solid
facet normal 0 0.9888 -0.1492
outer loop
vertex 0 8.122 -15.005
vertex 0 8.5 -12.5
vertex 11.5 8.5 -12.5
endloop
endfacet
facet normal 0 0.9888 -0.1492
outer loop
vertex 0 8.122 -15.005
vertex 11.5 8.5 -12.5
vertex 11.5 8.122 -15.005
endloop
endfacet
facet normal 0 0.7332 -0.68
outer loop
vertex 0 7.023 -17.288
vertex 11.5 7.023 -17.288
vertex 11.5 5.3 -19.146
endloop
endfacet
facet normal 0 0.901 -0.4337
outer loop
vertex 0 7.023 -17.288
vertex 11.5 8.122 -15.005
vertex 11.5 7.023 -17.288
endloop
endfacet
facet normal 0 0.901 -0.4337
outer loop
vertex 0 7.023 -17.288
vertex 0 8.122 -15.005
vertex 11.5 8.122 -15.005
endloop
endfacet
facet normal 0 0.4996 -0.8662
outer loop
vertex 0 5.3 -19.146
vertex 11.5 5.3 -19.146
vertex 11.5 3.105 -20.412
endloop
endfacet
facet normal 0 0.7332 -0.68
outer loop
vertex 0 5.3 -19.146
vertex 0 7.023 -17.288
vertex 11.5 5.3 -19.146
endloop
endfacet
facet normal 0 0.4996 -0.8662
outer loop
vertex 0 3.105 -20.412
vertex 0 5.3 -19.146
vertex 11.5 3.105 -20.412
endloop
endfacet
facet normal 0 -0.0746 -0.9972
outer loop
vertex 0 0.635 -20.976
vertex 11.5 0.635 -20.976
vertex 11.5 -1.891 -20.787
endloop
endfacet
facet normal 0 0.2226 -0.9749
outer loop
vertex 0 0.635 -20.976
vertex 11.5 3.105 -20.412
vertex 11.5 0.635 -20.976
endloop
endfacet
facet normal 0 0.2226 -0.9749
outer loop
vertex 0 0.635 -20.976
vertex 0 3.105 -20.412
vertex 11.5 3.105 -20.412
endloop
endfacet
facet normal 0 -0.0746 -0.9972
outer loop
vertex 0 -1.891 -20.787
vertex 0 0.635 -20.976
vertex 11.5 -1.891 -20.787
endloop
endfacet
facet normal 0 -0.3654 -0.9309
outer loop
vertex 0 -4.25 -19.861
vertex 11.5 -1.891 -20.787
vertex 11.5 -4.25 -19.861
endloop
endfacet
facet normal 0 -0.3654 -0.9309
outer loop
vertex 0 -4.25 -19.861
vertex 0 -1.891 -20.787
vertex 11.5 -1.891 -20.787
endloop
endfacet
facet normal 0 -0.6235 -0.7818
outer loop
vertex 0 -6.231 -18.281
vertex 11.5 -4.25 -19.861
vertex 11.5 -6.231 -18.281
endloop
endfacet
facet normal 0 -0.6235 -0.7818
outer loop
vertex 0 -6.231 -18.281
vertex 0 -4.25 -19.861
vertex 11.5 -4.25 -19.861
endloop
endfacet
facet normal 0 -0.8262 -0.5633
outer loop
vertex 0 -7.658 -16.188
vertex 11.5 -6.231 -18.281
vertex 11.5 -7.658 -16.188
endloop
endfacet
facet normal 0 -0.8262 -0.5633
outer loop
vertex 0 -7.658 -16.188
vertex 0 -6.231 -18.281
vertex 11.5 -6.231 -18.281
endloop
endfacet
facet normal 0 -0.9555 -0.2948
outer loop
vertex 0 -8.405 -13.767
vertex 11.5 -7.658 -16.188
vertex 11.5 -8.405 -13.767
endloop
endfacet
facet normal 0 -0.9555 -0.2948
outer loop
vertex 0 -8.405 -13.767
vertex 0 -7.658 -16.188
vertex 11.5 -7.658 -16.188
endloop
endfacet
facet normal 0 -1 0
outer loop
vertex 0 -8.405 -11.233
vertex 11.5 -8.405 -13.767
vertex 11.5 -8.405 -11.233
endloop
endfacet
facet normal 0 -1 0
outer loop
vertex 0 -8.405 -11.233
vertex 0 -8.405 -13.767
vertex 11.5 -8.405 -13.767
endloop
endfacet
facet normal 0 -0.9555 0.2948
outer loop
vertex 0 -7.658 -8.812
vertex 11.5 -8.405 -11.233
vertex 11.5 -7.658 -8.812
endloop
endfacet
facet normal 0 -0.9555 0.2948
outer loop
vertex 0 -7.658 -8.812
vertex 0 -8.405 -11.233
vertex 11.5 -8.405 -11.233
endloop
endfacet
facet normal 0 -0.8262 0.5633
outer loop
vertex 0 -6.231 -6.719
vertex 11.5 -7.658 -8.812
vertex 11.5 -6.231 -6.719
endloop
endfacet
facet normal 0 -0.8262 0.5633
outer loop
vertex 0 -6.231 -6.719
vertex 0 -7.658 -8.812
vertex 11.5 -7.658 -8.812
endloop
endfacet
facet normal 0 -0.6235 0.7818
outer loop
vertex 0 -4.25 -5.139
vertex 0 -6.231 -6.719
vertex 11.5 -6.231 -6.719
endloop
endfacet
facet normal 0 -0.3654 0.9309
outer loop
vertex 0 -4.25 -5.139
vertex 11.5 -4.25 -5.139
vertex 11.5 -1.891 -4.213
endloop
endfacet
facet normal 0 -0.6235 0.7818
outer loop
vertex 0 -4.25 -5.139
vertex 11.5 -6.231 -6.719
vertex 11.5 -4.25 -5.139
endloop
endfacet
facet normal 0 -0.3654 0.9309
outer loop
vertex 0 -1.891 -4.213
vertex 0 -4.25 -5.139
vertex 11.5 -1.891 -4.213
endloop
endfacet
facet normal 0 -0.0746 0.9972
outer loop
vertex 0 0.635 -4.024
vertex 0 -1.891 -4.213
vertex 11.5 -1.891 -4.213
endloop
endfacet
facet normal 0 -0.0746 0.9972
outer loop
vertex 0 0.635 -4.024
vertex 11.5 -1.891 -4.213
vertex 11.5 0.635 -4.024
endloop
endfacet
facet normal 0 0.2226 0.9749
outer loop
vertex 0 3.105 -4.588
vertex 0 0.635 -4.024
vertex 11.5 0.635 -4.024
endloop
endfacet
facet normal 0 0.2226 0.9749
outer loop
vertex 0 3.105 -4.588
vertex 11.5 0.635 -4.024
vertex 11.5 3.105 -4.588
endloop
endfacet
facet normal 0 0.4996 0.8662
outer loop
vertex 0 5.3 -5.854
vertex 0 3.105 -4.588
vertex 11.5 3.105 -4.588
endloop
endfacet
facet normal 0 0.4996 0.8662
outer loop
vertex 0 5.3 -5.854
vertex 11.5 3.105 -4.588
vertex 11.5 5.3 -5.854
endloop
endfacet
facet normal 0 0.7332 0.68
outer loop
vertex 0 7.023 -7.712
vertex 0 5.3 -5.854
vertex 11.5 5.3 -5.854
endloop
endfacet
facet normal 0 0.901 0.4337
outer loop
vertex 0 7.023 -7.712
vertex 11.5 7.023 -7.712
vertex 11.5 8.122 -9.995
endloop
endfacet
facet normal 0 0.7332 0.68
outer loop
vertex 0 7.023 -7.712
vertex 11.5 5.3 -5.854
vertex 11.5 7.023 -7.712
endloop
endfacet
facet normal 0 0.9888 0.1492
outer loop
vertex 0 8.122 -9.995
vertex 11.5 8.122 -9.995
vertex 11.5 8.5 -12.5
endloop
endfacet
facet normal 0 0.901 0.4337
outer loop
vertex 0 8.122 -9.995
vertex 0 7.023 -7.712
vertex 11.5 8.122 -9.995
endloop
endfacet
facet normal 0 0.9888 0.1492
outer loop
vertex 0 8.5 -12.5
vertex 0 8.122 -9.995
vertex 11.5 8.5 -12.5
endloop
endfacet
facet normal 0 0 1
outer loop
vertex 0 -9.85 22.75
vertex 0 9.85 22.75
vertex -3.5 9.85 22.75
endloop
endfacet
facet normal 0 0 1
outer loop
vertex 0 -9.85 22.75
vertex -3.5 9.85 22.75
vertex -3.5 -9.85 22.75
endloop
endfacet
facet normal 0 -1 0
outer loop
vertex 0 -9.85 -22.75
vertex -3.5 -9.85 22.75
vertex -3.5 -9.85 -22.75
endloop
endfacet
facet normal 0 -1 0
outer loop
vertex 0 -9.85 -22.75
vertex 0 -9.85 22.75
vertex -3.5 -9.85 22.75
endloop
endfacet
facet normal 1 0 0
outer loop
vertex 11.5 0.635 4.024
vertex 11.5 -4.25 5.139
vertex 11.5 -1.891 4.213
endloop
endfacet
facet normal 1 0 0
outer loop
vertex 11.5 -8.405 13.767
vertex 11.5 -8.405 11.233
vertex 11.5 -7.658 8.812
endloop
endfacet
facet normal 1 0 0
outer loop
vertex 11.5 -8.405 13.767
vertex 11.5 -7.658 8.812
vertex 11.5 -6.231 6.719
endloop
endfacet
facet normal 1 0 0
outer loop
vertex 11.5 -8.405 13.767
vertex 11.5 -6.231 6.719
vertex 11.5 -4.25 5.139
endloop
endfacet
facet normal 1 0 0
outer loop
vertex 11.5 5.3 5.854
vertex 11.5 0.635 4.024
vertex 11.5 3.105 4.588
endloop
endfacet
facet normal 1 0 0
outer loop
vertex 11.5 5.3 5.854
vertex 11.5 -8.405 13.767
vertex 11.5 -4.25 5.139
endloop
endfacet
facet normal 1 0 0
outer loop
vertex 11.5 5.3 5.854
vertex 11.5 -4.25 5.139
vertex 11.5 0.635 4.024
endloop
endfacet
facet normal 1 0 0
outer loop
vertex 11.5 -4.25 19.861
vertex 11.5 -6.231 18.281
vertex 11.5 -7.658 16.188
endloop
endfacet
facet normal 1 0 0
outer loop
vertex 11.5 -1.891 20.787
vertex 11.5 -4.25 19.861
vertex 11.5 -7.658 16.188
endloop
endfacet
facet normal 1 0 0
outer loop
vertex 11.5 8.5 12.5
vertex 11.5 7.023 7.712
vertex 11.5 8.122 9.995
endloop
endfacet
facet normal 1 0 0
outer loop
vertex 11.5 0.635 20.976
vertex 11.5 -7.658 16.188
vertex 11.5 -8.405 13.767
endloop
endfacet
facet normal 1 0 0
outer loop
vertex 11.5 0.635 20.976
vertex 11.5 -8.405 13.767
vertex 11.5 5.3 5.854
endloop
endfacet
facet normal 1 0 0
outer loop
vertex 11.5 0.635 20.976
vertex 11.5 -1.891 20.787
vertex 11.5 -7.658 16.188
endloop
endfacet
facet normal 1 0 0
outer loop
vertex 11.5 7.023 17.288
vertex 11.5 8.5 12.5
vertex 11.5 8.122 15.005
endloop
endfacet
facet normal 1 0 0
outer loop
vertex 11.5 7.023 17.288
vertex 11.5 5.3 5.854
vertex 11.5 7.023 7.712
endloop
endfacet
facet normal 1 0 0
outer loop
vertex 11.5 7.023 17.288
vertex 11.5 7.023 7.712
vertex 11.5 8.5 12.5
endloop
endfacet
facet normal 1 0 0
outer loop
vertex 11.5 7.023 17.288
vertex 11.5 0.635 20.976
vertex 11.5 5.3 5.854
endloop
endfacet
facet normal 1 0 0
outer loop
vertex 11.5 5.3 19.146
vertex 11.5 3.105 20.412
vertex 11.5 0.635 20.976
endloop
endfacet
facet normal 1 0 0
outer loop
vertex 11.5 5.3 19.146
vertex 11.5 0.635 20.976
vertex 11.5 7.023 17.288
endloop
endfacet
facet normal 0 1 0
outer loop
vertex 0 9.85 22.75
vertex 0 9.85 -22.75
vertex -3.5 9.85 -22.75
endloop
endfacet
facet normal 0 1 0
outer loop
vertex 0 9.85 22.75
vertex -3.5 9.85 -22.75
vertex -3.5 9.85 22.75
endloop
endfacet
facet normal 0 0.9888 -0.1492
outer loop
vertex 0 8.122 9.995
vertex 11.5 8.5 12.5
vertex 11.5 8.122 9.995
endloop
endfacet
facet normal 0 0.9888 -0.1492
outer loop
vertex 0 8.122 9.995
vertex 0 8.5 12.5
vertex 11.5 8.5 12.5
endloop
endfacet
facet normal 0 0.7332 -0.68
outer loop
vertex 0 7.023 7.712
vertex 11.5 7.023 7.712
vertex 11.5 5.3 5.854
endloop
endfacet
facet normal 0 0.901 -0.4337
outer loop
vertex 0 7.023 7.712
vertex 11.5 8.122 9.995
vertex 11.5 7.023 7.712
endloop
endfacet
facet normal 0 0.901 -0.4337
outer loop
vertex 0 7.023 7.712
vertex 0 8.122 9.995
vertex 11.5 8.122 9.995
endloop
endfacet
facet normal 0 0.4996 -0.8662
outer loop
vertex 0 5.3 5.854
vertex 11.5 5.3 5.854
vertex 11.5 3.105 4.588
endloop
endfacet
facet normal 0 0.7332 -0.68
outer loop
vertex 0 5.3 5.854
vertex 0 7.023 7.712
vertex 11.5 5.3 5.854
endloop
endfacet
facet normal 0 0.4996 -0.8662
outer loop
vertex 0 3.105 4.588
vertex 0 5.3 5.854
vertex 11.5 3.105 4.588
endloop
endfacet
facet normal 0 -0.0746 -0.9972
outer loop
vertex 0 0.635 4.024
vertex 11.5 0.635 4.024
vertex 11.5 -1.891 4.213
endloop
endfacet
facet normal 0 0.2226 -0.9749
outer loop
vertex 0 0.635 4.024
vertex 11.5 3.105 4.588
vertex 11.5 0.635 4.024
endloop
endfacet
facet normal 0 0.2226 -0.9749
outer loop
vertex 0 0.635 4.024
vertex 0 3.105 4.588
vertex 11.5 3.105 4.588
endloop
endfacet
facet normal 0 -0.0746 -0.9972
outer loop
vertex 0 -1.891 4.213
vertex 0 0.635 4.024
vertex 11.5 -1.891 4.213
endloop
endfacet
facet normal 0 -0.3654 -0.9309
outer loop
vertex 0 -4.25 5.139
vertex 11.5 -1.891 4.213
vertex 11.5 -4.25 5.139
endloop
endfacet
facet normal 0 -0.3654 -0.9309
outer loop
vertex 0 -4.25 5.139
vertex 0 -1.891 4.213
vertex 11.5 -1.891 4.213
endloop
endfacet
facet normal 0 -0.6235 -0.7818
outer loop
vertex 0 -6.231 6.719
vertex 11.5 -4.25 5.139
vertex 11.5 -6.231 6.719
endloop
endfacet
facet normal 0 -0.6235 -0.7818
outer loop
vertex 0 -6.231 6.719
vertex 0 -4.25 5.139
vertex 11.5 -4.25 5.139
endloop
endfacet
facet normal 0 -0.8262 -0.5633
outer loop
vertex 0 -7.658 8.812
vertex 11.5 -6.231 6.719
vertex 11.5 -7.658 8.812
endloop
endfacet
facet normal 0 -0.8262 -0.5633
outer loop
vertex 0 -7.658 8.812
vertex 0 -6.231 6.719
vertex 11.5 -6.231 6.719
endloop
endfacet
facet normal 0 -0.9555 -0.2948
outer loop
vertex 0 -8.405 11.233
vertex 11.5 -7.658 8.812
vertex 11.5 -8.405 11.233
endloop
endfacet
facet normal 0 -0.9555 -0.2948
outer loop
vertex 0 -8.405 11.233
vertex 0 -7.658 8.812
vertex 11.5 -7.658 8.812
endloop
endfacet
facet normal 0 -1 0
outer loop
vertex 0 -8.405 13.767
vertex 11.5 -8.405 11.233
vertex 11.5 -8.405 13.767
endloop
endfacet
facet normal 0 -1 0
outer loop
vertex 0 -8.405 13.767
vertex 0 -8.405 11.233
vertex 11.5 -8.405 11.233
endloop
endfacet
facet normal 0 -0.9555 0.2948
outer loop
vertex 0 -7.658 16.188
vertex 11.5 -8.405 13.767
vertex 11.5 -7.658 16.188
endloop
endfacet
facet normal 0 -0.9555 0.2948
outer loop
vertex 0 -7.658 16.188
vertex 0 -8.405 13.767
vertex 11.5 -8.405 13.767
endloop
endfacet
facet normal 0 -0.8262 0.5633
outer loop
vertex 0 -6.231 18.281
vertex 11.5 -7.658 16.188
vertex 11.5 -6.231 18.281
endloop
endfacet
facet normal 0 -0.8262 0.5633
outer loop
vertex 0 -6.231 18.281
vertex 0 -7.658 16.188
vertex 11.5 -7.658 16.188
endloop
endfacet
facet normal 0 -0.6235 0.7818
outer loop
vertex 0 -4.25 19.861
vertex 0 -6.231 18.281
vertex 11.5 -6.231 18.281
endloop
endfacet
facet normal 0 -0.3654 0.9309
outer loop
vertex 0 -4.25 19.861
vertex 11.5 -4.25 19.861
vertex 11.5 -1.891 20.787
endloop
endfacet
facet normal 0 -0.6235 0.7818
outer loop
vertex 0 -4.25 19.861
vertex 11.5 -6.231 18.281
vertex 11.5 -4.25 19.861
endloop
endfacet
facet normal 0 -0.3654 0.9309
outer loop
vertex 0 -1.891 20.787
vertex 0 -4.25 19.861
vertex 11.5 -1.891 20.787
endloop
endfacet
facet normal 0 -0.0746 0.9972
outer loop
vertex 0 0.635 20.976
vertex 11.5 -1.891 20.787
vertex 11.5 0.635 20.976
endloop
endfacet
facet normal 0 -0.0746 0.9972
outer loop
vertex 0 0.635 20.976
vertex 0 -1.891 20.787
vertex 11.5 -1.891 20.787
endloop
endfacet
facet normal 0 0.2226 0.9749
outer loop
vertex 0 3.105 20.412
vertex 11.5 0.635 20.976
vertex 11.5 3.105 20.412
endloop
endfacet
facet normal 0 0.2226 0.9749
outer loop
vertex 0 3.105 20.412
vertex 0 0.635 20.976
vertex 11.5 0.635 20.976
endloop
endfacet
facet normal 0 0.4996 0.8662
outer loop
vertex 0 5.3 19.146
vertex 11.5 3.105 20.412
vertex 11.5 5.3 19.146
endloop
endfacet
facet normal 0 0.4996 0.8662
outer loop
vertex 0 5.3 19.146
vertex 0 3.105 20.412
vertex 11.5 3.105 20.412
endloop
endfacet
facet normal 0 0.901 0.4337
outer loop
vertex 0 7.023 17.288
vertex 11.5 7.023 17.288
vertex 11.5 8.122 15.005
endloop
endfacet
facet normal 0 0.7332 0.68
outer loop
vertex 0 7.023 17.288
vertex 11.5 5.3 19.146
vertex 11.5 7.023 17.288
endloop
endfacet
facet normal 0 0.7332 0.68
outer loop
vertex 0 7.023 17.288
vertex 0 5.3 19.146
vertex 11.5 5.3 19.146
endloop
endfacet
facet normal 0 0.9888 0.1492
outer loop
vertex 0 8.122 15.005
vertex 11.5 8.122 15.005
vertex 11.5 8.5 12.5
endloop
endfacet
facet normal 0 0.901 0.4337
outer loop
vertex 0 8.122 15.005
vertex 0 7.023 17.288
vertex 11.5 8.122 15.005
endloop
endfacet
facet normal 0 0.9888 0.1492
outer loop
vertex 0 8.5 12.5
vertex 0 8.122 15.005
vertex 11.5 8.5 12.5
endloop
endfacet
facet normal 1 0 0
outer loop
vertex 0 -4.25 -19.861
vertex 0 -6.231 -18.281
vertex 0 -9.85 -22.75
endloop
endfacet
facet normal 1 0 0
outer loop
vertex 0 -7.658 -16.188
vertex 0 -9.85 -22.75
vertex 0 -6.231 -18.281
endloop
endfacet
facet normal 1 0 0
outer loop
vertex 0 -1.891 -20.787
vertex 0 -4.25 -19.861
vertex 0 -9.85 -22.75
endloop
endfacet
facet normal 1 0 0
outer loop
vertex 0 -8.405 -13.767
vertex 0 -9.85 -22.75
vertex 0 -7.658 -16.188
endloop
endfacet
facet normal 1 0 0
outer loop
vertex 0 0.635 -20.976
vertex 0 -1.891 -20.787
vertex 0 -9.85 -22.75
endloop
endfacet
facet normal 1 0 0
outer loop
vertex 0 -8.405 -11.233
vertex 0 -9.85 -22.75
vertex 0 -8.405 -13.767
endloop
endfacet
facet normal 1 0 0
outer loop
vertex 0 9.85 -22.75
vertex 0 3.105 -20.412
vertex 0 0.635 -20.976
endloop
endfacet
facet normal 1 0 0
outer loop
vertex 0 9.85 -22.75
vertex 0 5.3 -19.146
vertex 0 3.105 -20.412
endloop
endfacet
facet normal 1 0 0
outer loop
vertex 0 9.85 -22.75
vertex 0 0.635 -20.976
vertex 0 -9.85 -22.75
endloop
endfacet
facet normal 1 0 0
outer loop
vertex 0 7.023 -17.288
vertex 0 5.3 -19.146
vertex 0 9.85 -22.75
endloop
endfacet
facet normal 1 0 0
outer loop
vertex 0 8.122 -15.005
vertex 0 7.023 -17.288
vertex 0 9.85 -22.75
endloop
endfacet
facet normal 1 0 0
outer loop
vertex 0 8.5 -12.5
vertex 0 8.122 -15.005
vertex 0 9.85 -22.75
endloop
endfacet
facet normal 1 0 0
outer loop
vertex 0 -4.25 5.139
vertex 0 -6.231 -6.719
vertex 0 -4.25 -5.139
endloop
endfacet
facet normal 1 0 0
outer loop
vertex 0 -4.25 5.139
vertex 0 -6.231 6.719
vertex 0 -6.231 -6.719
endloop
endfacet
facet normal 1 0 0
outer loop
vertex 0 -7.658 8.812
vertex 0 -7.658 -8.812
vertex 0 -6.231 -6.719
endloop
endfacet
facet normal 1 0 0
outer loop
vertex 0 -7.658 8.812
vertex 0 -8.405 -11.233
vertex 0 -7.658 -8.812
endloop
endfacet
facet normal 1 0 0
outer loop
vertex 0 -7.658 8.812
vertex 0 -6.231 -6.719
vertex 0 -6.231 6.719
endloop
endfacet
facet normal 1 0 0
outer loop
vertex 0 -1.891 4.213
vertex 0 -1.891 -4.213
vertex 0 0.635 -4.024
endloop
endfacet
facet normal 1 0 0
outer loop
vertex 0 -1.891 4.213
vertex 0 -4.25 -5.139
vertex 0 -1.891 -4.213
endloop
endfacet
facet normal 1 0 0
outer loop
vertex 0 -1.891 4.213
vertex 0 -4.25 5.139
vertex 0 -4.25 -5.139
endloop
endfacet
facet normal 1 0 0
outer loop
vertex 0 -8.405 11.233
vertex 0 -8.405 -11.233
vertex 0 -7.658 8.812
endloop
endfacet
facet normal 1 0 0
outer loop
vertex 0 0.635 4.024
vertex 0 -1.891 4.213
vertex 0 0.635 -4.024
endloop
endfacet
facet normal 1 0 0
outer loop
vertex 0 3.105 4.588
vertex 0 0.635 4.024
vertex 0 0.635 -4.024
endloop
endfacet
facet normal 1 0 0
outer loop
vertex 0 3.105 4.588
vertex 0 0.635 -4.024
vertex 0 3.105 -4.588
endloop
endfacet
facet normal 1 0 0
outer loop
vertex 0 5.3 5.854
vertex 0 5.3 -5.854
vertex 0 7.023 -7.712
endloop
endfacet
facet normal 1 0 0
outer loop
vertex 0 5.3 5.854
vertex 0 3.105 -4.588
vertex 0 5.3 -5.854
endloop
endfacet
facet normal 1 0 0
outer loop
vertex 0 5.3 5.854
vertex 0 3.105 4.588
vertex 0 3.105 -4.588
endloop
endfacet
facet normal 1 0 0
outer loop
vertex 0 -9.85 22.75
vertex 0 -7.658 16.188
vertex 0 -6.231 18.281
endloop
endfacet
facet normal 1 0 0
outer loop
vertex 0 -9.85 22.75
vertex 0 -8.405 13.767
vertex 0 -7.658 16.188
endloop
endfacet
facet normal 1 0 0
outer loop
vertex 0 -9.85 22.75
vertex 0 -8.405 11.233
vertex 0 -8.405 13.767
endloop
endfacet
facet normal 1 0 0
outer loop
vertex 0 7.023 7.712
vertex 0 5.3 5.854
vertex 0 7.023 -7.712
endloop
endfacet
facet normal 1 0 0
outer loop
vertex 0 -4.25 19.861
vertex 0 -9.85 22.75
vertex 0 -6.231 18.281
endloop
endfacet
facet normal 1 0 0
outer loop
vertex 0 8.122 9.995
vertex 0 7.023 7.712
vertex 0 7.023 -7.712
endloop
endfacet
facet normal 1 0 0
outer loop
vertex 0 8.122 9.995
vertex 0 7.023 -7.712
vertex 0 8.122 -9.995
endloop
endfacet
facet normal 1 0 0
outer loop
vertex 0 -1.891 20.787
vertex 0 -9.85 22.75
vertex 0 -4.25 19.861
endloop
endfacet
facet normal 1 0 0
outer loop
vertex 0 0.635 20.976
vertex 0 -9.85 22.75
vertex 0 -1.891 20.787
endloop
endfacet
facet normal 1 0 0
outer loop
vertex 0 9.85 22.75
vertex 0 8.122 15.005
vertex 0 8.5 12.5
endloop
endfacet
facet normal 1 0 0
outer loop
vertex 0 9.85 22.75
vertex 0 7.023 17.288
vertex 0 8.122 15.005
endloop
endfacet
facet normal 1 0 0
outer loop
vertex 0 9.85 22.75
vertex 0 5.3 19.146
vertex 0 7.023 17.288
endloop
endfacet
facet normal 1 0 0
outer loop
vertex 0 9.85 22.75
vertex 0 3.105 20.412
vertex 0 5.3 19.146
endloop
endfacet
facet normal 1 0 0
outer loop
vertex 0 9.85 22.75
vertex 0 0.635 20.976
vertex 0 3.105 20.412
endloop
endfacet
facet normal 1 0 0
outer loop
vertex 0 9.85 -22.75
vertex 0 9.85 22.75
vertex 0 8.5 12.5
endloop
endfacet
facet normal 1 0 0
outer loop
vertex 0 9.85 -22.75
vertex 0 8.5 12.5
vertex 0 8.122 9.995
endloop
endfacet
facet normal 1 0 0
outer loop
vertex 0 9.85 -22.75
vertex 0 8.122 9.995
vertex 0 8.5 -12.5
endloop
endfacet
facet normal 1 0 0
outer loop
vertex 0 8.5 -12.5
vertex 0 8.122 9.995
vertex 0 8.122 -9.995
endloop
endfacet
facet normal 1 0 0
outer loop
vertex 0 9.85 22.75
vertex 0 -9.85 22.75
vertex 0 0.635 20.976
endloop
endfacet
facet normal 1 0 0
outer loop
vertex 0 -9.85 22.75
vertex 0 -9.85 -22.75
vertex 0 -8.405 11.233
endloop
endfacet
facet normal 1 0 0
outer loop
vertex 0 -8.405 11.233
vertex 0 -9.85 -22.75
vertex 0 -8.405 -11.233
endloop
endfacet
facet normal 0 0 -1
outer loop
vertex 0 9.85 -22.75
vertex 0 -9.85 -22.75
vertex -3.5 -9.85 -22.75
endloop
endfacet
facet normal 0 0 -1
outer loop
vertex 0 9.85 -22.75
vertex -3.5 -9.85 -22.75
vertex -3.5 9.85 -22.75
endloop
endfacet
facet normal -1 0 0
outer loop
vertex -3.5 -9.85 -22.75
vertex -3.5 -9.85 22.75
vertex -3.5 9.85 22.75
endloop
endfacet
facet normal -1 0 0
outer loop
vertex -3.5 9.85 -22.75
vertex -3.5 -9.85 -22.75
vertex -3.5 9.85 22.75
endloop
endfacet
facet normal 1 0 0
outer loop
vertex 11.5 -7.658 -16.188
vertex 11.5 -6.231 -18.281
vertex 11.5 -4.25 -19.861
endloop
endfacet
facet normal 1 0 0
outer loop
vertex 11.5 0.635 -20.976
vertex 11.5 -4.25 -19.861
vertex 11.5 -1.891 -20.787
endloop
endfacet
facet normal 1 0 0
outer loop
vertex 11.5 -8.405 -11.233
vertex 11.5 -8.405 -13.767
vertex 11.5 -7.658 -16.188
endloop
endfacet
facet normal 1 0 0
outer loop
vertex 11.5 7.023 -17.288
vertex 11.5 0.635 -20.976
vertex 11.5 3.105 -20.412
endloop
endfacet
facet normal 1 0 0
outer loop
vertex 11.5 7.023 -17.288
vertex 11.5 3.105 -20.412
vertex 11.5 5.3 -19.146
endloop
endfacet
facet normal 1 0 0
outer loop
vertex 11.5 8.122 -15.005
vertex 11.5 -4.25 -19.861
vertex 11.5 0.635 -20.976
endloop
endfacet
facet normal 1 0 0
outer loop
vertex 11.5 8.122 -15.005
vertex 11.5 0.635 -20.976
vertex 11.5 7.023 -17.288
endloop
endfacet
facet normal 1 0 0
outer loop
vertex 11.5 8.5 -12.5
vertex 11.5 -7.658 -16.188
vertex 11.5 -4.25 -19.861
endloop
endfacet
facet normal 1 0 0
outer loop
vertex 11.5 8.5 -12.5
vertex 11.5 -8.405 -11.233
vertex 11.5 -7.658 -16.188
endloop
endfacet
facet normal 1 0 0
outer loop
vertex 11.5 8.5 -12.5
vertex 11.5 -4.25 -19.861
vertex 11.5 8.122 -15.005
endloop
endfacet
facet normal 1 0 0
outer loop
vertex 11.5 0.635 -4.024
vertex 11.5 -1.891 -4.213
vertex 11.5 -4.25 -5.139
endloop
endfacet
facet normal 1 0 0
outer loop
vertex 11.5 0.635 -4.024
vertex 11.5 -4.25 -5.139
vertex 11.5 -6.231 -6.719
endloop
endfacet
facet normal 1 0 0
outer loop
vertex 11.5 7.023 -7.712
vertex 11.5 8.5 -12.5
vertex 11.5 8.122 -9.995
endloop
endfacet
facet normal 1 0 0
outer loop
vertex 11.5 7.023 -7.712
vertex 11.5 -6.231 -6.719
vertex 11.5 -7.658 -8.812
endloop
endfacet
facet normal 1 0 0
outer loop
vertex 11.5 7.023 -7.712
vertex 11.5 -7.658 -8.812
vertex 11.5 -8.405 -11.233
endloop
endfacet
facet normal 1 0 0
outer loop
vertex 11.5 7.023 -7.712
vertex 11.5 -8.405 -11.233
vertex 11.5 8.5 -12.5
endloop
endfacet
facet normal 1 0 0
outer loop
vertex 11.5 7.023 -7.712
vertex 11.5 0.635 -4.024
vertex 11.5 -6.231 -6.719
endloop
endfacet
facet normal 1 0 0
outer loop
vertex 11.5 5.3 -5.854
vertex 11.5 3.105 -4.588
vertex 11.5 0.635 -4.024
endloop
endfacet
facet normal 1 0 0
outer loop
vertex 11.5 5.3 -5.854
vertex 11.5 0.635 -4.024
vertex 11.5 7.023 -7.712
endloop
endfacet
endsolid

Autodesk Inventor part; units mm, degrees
ref_plane "YZ Plane" through (0, 0, 0) normal (1, 0, 0) x (0, 1, 0)
ref_plane "XZ Plane" through (0, 0, 0) normal (0, 1, 0) x (-1, 0, 0)
ref_plane "XY Plane" through (0, 0, 0) normal (0, 0, 1) x (1, 0, 0)
sketch "Sketch1" plane through (0, 0, 0) normal (1, 0, 0) x (0, 1, 0)
  line L0 (9.85, 22.75) -> (-9.85, 22.75)
  line L1 (-9.85, 22.75) -> (-9.85, -22.75)
  line L2 (-9.85, -22.75) -> (9.85, -22.75)
  line L3 (9.85, -22.75) -> (9.85, 22.75)
  circle A0 centre (0, 12.5) radius 8.5
  circle A1 centre (0, -12.5) radius 8.5
  line L4 (0, -12.5) -> (0, 12.5) construction
  point P0 (0, 0)
  point P1 (0, 0)
  point P2 (9.85, 0)
  point P3 (0, -22.75)
  dimension "d0" = 45.5
  dimension "d1" = 17
  dimension "d3" = 42
  dimension "d4" = 19.7
extrude "Extrusion1" add sketch "Sketch1" against normal blind 3.5 contours L3 L2 L1 L0 | A0 | A1
extrude "Extrusion2" add sketch "Sketch1" along normal blind 11.5 contours A0 | A1
properties part number "ultrasonic"
